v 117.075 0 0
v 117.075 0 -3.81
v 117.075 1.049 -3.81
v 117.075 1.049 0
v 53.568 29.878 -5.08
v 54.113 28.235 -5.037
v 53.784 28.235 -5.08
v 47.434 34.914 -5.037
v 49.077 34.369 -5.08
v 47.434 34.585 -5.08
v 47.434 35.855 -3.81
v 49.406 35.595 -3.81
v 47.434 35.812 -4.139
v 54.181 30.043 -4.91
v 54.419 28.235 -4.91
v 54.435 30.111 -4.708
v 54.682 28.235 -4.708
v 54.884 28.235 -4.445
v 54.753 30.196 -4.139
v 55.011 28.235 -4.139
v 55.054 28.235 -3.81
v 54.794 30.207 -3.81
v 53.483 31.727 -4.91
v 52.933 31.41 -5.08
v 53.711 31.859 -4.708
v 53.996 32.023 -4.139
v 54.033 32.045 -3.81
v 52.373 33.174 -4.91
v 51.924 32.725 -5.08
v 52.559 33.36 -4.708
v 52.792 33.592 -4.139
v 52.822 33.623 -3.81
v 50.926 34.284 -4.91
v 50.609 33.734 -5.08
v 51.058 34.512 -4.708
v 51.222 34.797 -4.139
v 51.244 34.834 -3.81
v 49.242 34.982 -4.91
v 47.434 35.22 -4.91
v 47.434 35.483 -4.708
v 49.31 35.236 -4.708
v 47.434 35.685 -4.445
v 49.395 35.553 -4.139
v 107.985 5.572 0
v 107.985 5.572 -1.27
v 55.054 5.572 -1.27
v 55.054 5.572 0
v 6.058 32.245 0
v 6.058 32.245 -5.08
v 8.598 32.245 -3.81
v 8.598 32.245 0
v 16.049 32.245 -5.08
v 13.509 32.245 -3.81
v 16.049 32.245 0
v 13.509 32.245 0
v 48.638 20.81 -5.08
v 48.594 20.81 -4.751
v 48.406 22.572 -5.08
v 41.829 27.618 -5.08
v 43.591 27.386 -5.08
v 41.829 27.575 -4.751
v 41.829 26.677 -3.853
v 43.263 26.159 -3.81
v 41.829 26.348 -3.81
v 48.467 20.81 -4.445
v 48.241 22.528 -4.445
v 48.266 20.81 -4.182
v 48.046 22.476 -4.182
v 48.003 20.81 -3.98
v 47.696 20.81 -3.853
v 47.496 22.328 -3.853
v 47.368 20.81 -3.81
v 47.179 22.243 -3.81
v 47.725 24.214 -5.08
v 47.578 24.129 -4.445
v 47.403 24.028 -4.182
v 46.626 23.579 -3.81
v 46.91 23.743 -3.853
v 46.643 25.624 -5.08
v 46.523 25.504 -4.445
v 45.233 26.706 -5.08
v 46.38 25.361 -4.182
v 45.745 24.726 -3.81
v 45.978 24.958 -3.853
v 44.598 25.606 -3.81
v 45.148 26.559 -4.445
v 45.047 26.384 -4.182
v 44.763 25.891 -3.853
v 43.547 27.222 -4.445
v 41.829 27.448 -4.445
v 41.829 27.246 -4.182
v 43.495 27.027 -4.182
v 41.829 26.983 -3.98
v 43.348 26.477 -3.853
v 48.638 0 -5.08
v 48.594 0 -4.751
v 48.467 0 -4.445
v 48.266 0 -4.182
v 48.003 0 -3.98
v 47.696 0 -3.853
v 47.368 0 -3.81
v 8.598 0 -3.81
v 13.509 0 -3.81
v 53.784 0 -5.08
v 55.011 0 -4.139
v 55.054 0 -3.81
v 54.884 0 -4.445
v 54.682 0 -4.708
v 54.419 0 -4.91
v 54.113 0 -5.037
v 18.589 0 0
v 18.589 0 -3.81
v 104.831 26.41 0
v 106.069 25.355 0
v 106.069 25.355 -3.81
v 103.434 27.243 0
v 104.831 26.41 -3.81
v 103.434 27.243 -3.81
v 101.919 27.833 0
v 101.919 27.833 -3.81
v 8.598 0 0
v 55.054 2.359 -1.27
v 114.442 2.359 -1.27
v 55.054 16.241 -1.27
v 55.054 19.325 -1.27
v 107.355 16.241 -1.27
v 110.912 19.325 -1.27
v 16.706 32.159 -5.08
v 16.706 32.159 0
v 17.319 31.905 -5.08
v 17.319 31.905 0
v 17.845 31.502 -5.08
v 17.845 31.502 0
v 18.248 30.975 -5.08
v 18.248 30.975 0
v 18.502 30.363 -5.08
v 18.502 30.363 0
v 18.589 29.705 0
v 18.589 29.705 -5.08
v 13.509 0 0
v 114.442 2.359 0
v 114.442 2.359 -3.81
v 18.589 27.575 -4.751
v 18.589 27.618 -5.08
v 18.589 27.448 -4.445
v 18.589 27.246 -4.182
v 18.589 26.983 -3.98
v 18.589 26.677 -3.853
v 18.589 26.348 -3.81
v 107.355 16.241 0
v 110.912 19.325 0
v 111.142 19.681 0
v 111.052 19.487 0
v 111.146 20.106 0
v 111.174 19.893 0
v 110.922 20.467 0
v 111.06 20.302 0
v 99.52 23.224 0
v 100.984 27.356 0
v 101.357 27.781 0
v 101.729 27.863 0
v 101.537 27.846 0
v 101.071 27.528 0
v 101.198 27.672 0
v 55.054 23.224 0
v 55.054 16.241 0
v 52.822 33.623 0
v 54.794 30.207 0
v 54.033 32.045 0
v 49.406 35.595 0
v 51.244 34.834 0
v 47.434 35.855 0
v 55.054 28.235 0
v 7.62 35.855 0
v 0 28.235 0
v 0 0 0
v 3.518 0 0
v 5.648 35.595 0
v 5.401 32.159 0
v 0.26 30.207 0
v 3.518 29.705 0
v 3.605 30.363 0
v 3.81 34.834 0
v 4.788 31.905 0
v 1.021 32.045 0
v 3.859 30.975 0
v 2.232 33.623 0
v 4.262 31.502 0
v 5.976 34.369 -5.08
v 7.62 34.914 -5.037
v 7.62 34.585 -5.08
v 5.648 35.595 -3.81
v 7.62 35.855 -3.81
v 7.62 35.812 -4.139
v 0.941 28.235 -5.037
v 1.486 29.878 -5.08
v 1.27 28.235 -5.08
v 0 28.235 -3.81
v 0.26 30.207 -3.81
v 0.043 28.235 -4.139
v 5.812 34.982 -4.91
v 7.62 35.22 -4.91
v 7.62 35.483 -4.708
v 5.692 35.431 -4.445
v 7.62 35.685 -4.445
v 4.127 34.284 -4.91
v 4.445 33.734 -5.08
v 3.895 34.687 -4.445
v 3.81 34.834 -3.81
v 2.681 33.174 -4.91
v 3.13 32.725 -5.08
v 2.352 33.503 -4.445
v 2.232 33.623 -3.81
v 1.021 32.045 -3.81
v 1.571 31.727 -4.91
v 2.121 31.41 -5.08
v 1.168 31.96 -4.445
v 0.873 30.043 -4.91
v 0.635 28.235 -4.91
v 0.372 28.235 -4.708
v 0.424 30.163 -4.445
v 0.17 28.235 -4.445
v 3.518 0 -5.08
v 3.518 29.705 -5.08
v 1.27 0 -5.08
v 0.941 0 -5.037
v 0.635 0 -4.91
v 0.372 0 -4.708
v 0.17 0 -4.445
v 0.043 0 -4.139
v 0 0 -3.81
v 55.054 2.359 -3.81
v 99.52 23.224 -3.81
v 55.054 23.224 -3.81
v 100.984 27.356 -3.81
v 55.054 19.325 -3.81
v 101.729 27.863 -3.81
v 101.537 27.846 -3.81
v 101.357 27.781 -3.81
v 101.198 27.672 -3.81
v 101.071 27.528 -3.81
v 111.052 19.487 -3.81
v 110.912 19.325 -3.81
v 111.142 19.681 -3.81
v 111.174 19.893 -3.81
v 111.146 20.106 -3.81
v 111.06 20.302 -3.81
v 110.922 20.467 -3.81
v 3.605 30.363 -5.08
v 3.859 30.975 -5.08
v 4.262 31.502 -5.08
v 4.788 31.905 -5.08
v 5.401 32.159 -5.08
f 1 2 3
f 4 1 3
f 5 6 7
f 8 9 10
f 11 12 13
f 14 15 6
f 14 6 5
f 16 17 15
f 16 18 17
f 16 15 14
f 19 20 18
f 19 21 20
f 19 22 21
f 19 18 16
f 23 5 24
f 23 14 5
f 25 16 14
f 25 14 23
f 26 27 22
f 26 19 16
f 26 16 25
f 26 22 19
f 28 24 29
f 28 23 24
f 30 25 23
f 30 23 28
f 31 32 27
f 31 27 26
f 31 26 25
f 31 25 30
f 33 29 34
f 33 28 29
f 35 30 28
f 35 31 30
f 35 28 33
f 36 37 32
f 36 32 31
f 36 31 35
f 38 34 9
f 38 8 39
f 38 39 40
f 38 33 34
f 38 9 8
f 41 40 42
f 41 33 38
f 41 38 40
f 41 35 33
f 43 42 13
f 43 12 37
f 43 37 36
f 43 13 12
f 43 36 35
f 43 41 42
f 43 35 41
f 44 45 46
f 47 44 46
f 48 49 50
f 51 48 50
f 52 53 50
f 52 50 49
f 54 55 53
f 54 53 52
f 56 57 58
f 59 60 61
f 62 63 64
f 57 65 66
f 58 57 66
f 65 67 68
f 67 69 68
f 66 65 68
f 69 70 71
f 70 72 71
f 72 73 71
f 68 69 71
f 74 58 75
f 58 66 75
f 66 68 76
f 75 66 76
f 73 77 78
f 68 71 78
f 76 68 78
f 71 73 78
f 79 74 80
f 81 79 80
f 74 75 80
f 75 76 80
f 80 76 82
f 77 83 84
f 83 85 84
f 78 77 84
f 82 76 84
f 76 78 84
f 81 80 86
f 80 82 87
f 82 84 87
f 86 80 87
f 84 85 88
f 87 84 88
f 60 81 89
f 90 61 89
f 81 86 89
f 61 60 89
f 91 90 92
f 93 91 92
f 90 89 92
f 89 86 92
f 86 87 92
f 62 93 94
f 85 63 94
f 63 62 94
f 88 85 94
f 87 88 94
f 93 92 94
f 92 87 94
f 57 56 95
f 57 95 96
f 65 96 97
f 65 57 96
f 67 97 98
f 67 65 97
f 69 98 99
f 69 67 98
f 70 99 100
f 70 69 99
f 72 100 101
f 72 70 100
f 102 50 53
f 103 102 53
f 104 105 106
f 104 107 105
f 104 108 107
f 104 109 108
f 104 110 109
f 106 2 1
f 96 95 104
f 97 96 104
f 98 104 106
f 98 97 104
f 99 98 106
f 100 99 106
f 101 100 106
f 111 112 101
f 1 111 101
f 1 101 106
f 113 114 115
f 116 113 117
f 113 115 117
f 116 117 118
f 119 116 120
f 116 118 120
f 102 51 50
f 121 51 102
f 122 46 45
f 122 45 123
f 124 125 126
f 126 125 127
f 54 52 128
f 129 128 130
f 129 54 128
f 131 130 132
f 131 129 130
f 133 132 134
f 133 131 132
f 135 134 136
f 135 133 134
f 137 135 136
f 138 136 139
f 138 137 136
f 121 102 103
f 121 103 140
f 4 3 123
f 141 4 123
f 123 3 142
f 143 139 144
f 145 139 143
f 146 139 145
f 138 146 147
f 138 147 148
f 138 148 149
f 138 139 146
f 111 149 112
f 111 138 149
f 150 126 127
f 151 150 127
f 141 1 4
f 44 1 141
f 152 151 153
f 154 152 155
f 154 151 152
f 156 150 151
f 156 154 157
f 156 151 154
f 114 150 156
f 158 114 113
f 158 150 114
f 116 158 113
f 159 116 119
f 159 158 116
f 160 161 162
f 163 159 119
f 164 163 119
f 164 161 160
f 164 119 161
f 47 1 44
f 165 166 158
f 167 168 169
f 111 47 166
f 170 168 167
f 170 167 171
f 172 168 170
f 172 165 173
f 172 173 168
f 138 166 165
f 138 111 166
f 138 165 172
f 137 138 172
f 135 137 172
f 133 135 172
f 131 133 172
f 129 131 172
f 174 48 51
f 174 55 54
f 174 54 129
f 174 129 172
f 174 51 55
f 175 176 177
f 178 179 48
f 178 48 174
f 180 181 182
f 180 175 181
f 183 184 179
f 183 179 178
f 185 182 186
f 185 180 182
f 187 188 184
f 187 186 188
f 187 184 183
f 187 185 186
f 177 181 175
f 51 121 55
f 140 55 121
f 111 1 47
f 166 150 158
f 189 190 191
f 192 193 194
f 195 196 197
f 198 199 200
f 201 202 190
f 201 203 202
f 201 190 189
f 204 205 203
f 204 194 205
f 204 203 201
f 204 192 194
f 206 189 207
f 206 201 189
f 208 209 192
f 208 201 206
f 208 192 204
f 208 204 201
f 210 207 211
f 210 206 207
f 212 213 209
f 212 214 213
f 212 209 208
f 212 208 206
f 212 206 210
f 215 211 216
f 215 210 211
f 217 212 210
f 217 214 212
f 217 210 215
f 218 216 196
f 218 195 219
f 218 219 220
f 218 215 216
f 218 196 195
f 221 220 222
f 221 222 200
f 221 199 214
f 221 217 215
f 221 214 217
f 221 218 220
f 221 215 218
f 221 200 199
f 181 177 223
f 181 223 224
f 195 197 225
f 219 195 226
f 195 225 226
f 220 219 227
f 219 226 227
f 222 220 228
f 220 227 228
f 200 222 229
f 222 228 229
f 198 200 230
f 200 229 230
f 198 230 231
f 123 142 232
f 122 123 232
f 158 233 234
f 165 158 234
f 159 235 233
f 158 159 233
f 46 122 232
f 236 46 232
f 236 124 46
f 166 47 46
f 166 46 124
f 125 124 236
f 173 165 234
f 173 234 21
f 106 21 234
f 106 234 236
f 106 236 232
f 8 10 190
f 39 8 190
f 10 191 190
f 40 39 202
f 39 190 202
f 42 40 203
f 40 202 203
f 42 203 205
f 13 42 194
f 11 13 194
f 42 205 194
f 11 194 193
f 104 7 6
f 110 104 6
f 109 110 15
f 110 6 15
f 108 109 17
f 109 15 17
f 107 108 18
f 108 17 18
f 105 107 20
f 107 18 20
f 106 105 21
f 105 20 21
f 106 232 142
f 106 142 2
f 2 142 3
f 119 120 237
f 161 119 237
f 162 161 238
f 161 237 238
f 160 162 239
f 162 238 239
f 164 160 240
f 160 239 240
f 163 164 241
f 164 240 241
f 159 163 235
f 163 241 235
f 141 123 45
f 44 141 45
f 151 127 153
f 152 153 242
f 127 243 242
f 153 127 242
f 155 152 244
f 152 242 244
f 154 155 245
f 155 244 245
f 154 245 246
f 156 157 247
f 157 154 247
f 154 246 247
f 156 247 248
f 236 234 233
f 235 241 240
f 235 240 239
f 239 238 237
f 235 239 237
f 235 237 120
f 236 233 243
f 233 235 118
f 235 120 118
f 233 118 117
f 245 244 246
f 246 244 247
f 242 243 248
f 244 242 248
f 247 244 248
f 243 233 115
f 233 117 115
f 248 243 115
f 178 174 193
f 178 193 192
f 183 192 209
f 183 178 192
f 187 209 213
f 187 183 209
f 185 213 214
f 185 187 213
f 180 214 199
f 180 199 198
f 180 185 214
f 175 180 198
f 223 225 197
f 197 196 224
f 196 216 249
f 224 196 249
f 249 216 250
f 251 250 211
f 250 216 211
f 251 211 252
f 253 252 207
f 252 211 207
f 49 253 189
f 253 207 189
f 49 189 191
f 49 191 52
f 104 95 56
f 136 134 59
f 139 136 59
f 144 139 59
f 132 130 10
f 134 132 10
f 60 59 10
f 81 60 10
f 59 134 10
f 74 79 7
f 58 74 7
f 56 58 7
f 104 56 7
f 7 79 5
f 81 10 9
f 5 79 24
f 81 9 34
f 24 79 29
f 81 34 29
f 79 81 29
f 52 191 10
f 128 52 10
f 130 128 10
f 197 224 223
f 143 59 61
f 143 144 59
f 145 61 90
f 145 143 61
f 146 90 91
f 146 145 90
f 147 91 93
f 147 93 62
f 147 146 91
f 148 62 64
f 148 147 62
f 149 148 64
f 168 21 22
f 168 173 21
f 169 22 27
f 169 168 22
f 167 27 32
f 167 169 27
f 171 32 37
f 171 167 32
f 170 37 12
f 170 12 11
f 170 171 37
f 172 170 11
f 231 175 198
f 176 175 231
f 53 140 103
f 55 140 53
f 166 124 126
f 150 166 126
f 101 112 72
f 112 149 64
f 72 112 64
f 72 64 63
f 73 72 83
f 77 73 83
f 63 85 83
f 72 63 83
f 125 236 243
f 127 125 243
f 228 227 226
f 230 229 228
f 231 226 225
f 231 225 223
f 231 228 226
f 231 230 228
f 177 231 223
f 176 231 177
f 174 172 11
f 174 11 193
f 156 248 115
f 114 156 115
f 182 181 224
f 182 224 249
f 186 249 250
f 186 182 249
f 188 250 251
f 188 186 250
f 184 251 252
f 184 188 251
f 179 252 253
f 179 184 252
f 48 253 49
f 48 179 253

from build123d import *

# Parameters (mm, degrees)
EXTRUDE1_DEPTH          = 5.08
EXTRUDE2_DEPTH          = 1.27
EXTRUDE3_DEPTH          = 3.81
SKETCH1_5_W             = 4.91012523
SKETCH1_5_H             = 32.245498845
EXTRUDE4_DEPTH          = 3.81
FILLET2_R               = 1.27
FILLET3_R               = 1.27
CUT_EXTRUDE1_DEPTH      = 123.54722299
CUT_EXTRUDE1_DEPTH_BACK = 123.54722299


with BuildPart() as part:
    # Sketch1 → Extrude1 (new, symmetric)
    with BuildSketch(Plane.XY):
        with BuildLine():
            Line((55.053954756, 23.223525864), (55.053954756, 28.234899079))
            ThreePointArc((55.053954756, 28.234899079), (52.822108428, 33.623052752), (47.433954756, 35.854899079))
            Line((47.433954756, 35.854899079), (7.62, 35.854899079))
            ThreePointArc((7.62, 35.854899079), (2.231846327, 33.623052752), (0, 28.234899079))
            Line((0, 28.234899079), (0, -28.234899079))
            ThreePointArc((0, -28.234899079), (2.231846327, -33.623052752), (7.62, -35.854899079))
            Line((7.62, -35.854899079), (47.433954756, -35.854899079))
            ThreePointArc((47.433954756, -35.854899079), (52.822108428, -33.623052752), (55.053954756, -28.234899079))
            Line((55.053954756, -28.234899079), (55.053954756, -23.223525864))
            Line((55.053954756, -23.223525864), (55.053954756, -19.324782682))
            Line((55.053954756, -19.324782682), (55.053954756, -16.240810389))
            Line((55.053954756, -16.240810389), (55.053954756, -5.571934871))
            Line((55.053954756, -5.571934871), (55.053954756, -2.359181621))
            Line((55.053954756, -2.359181621), (55.053954756, 2.359181621))
            Line((55.053954756, 2.359181621), (55.053954756, 5.571934871))
            Line((55.053954756, 5.571934871), (55.053954756, 16.240810389))
            Line((55.053954756, 16.240810389), (55.053954756, 19.324782682))
            Line((55.053954756, 19.324782682), (55.053954756, 23.223525864))
        make_face()
        with BuildLine():
            ThreePointArc((16.048576777, 32.245498845), (17.844628001, 31.501550069), (18.588576777, 29.705498845))
            Line((18.588576777, 29.705498845), (18.588576777, 27.618036038))
            Line((18.588576777, 27.618036038), (41.829183295, 27.618036038))
            ThreePointArc((41.829183295, 27.618036038), (46.643426698, 25.623911128), (48.637551607, 20.809667725))
            Line((48.637551607, 20.809667725), (48.637551607, -20.809667725))
            ThreePointArc((48.637551607, -20.809667725), (46.643426698, -25.623911128), (41.829183295, -27.618036038))
            Line((41.829183295, -27.618036038), (18.588576777, -27.618036038))
            Line((18.588576777, -27.618036038), (18.588576777, -29.705498845))
            ThreePointArc((18.588576777, -29.705498845), (17.844628001, -31.501550069), (16.048576777, -32.245498845))
            Line((16.048576777, -32.245498845), (13.508576777, -32.245498845))
            Line((13.508576777, -32.245498845), (8.598451547, -32.245498845))
            Line((8.598451547, -32.245498845), (6.058451547, -32.245498845))
            ThreePointArc((6.058451547, -32.245498845), (4.262400322, -31.501550069), (3.518451547, -29.705498845))
            Line((3.518451547, -29.705498845), (3.518451547, 29.705498845))
            ThreePointArc((3.518451547, 29.705498845), (4.262400322, 31.501550069), (6.058451547, 32.245498845))
            Line((6.058451547, 32.245498845), (8.598451547, 32.245498845))
            Line((8.598451547, 32.245498845), (13.508576777, 32.245498845))
            Line((13.508576777, 32.245498845), (16.048576777, 32.245498845))
        make_face(mode=Mode.SUBTRACT)
    extrude(amount=EXTRUDE1_DEPTH, both=True)

    # Sketch1<3> → Extrude2 (add, symmetric)
    with BuildSketch(Plane.XY):
        Polygon((110.911701022, 19.324782682), (55.053954756, 19.324782682), (55.053954756, 16.240810389), (107.354901489, 16.240810389), align=None)
        Polygon((114.44157437, -2.359181621), (55.053954756, -2.359181621), (55.053954756, -5.571934871), (107.985089149, -5.571934871), align=None)
        Polygon((107.985089149, 5.571934871), (55.053954756, 5.571934871), (55.053954756, 2.359181621), (114.44157437, 2.359181621), align=None)
        Polygon((107.354901489, -16.240810389), (55.053954756, -16.240810389), (55.053954756, -19.324782682), (110.911701022, -19.324782682), align=None)
    extrude(amount=EXTRUDE2_DEPTH, both=True)

    # Sketch1<4> → Extrude3 (add, symmetric)
    with BuildSketch(Plane.XY):
        with BuildLine():
            Line((99.519849351, 23.223525864), (55.053954756, 23.223525864))
            Line((55.053954756, 23.223525864), (55.053954756, 19.324782682))
            Line((55.053954756, 19.324782682), (110.911701022, 19.324782682))
            ThreePointArc((110.911701022, 19.324782682), (111.174479609, 19.893330482), (110.922452685, 20.466725298))
            Line((110.922452685, 20.466725298), (106.069134127, 25.355454719))
            ThreePointArc((106.069134127, 25.355454719), (104.150057648, 26.85581949), (101.918508412, 27.832618847))
            ThreePointArc((101.918508412, 27.832618847), (101.356567079, 27.780652221), (100.984486575, 27.356347272))
            Line((100.984486575, 27.356347272), (99.519849351, 23.223525864))
        make_face()
        Polygon((114.44157437, 2.359181621), (55.053954756, 2.359181621), (55.053954756, -2.359181621), (114.44157437, -2.359181621), (117.074513308, -1.049028675), (117.074513308, 1.049028675), align=None)
        with BuildLine():
            Line((55.053954756, -19.324782682), (55.053954756, -23.223525864))
            Line((55.053954756, -23.223525864), (99.519849351, -23.223525864))
            Line((99.519849351, -23.223525864), (101.216749822, -28.011733127))
            ThreePointArc((101.216749822, -28.011733127), (103.835645626, -27.035617331), (106.069134127, -25.355454719))
            Line((106.069134127, -25.355454719), (110.922452685, -20.466725298))
            ThreePointArc((110.922452685, -20.466725298), (111.174479609, -19.893330482), (110.911701022, -19.324782682))
            Line((110.911701022, -19.324782682), (55.053954756, -19.324782682))
        make_face()
    extrude(amount=EXTRUDE3_DEPTH, both=True)

    # Sketch1<5> → Extrude4 (add, symmetric)
    with BuildSketch(Plane.XY):
        with BuildLine():
            Line((48.637551607, 0), (18.588576777, 0))
            Line((18.588576777, 0), (18.588576777, -27.618036038))
            Line((18.588576777, -27.618036038), (41.829183295, -27.618036038))
            ThreePointArc((41.829183295, -27.618036038), (46.643426698, -25.623911128), (48.637551607, -20.809667725))
            Line((48.637551607, -20.809667725), (48.637551607, 0))
        make_face()
        with BuildLine():
            Line((18.588576777, 27.618036038), (18.588576777, 0))
            Line((18.588576777, 0), (48.637551607, 0))
            Line((48.637551607, 0), (48.637551607, 20.809667725))
            ThreePointArc((48.637551607, 20.809667725), (46.643426698, 25.623911128), (41.829183295, 27.618036038))
            Line((41.829183295, 27.618036038), (18.588576777, 27.618036038))
        make_face()
        with Locations((11.053514162, -16.122749423)):
            Rectangle(SKETCH1_5_W, SKETCH1_5_H)
        with Locations((11.053514162, 16.122749423)):
            Rectangle(SKETCH1_5_W, SKETCH1_5_H)
    extrude(amount=EXTRUDE4_DEPTH, both=True)

    # Fillet2
    fillet2_edges = [part.edges().sort_by_distance(p)[0] for p in [
        (30.208880036, -27.618036038, -3.81),
        (30.208880036, -27.618036038, 3.81),
        (46.643426698, -25.623911128, -3.81),
        (46.643426698, -25.623911128, 3.81),
        (48.637551607, 0, -3.81),
        (48.637551607, 0, 3.81),
        (46.643426698, 25.623911128, -3.81),
        (46.643426698, 25.623911128, 3.81),
        (30.208880036, 27.618036038, -3.81),
        (30.208880036, 27.618036038, 3.81),
    ]]
    fillet(fillet2_edges, radius=FILLET2_R - 0.0001)  # a hair under: the kernel refuses the full size

    # Fillet3
    fillet3_edges = [part.edges().sort_by_distance(p)[0] for p in [
        (2.231846327, 33.623052752, -5.08),
        (27.526977378, 35.854899079, -5.08),
        (52.822108428, 33.623052752, -5.08),
        (55.053954756, 0, -5.08),
        (52.822108428, -33.623052752, -5.08),
        (27.526977378, -35.854899079, -5.08),
        (2.231846327, -33.623052752, -5.08),
        (0, 0, -5.08),
        (0, 0, 5.08),
        (2.231846327, -33.623052752, 5.08),
        (27.526977378, -35.854899079, 5.08),
        (52.822108428, -33.623052752, 5.08),
        (55.053954756, 0, 5.08),
        (52.822108428, 33.623052752, 5.08),
        (27.526977378, 35.854899079, 5.08),
        (2.231846327, 33.623052752, 5.08),
    ]]
    fillet(fillet3_edges, radius=FILLET3_R - 0.0001)  # a hair under: the kernel refuses the full size

    # Sketch2 → Cut-Extrude1 (cut, two sides: drawn at the far end of the back side and taken through both)
    with BuildSketch(Plane(origin=(117.074513308, 0, 0), x_dir=(0, 0, -1), z_dir=(1, 0, 0)).offset(-CUT_EXTRUDE1_DEPTH_BACK)):
        Polygon((158.859018875, 0), (5.08, 0), (0, 0), (0, 35.854899079), (0, 189.633917954), (-235.763888228, -7.868830363), (-76.904869352, -197.502748317), align=None)
    extrude(amount=CUT_EXTRUDE1_DEPTH + CUT_EXTRUDE1_DEPTH_BACK, mode=Mode.SUBTRACT)


solid = part.part
